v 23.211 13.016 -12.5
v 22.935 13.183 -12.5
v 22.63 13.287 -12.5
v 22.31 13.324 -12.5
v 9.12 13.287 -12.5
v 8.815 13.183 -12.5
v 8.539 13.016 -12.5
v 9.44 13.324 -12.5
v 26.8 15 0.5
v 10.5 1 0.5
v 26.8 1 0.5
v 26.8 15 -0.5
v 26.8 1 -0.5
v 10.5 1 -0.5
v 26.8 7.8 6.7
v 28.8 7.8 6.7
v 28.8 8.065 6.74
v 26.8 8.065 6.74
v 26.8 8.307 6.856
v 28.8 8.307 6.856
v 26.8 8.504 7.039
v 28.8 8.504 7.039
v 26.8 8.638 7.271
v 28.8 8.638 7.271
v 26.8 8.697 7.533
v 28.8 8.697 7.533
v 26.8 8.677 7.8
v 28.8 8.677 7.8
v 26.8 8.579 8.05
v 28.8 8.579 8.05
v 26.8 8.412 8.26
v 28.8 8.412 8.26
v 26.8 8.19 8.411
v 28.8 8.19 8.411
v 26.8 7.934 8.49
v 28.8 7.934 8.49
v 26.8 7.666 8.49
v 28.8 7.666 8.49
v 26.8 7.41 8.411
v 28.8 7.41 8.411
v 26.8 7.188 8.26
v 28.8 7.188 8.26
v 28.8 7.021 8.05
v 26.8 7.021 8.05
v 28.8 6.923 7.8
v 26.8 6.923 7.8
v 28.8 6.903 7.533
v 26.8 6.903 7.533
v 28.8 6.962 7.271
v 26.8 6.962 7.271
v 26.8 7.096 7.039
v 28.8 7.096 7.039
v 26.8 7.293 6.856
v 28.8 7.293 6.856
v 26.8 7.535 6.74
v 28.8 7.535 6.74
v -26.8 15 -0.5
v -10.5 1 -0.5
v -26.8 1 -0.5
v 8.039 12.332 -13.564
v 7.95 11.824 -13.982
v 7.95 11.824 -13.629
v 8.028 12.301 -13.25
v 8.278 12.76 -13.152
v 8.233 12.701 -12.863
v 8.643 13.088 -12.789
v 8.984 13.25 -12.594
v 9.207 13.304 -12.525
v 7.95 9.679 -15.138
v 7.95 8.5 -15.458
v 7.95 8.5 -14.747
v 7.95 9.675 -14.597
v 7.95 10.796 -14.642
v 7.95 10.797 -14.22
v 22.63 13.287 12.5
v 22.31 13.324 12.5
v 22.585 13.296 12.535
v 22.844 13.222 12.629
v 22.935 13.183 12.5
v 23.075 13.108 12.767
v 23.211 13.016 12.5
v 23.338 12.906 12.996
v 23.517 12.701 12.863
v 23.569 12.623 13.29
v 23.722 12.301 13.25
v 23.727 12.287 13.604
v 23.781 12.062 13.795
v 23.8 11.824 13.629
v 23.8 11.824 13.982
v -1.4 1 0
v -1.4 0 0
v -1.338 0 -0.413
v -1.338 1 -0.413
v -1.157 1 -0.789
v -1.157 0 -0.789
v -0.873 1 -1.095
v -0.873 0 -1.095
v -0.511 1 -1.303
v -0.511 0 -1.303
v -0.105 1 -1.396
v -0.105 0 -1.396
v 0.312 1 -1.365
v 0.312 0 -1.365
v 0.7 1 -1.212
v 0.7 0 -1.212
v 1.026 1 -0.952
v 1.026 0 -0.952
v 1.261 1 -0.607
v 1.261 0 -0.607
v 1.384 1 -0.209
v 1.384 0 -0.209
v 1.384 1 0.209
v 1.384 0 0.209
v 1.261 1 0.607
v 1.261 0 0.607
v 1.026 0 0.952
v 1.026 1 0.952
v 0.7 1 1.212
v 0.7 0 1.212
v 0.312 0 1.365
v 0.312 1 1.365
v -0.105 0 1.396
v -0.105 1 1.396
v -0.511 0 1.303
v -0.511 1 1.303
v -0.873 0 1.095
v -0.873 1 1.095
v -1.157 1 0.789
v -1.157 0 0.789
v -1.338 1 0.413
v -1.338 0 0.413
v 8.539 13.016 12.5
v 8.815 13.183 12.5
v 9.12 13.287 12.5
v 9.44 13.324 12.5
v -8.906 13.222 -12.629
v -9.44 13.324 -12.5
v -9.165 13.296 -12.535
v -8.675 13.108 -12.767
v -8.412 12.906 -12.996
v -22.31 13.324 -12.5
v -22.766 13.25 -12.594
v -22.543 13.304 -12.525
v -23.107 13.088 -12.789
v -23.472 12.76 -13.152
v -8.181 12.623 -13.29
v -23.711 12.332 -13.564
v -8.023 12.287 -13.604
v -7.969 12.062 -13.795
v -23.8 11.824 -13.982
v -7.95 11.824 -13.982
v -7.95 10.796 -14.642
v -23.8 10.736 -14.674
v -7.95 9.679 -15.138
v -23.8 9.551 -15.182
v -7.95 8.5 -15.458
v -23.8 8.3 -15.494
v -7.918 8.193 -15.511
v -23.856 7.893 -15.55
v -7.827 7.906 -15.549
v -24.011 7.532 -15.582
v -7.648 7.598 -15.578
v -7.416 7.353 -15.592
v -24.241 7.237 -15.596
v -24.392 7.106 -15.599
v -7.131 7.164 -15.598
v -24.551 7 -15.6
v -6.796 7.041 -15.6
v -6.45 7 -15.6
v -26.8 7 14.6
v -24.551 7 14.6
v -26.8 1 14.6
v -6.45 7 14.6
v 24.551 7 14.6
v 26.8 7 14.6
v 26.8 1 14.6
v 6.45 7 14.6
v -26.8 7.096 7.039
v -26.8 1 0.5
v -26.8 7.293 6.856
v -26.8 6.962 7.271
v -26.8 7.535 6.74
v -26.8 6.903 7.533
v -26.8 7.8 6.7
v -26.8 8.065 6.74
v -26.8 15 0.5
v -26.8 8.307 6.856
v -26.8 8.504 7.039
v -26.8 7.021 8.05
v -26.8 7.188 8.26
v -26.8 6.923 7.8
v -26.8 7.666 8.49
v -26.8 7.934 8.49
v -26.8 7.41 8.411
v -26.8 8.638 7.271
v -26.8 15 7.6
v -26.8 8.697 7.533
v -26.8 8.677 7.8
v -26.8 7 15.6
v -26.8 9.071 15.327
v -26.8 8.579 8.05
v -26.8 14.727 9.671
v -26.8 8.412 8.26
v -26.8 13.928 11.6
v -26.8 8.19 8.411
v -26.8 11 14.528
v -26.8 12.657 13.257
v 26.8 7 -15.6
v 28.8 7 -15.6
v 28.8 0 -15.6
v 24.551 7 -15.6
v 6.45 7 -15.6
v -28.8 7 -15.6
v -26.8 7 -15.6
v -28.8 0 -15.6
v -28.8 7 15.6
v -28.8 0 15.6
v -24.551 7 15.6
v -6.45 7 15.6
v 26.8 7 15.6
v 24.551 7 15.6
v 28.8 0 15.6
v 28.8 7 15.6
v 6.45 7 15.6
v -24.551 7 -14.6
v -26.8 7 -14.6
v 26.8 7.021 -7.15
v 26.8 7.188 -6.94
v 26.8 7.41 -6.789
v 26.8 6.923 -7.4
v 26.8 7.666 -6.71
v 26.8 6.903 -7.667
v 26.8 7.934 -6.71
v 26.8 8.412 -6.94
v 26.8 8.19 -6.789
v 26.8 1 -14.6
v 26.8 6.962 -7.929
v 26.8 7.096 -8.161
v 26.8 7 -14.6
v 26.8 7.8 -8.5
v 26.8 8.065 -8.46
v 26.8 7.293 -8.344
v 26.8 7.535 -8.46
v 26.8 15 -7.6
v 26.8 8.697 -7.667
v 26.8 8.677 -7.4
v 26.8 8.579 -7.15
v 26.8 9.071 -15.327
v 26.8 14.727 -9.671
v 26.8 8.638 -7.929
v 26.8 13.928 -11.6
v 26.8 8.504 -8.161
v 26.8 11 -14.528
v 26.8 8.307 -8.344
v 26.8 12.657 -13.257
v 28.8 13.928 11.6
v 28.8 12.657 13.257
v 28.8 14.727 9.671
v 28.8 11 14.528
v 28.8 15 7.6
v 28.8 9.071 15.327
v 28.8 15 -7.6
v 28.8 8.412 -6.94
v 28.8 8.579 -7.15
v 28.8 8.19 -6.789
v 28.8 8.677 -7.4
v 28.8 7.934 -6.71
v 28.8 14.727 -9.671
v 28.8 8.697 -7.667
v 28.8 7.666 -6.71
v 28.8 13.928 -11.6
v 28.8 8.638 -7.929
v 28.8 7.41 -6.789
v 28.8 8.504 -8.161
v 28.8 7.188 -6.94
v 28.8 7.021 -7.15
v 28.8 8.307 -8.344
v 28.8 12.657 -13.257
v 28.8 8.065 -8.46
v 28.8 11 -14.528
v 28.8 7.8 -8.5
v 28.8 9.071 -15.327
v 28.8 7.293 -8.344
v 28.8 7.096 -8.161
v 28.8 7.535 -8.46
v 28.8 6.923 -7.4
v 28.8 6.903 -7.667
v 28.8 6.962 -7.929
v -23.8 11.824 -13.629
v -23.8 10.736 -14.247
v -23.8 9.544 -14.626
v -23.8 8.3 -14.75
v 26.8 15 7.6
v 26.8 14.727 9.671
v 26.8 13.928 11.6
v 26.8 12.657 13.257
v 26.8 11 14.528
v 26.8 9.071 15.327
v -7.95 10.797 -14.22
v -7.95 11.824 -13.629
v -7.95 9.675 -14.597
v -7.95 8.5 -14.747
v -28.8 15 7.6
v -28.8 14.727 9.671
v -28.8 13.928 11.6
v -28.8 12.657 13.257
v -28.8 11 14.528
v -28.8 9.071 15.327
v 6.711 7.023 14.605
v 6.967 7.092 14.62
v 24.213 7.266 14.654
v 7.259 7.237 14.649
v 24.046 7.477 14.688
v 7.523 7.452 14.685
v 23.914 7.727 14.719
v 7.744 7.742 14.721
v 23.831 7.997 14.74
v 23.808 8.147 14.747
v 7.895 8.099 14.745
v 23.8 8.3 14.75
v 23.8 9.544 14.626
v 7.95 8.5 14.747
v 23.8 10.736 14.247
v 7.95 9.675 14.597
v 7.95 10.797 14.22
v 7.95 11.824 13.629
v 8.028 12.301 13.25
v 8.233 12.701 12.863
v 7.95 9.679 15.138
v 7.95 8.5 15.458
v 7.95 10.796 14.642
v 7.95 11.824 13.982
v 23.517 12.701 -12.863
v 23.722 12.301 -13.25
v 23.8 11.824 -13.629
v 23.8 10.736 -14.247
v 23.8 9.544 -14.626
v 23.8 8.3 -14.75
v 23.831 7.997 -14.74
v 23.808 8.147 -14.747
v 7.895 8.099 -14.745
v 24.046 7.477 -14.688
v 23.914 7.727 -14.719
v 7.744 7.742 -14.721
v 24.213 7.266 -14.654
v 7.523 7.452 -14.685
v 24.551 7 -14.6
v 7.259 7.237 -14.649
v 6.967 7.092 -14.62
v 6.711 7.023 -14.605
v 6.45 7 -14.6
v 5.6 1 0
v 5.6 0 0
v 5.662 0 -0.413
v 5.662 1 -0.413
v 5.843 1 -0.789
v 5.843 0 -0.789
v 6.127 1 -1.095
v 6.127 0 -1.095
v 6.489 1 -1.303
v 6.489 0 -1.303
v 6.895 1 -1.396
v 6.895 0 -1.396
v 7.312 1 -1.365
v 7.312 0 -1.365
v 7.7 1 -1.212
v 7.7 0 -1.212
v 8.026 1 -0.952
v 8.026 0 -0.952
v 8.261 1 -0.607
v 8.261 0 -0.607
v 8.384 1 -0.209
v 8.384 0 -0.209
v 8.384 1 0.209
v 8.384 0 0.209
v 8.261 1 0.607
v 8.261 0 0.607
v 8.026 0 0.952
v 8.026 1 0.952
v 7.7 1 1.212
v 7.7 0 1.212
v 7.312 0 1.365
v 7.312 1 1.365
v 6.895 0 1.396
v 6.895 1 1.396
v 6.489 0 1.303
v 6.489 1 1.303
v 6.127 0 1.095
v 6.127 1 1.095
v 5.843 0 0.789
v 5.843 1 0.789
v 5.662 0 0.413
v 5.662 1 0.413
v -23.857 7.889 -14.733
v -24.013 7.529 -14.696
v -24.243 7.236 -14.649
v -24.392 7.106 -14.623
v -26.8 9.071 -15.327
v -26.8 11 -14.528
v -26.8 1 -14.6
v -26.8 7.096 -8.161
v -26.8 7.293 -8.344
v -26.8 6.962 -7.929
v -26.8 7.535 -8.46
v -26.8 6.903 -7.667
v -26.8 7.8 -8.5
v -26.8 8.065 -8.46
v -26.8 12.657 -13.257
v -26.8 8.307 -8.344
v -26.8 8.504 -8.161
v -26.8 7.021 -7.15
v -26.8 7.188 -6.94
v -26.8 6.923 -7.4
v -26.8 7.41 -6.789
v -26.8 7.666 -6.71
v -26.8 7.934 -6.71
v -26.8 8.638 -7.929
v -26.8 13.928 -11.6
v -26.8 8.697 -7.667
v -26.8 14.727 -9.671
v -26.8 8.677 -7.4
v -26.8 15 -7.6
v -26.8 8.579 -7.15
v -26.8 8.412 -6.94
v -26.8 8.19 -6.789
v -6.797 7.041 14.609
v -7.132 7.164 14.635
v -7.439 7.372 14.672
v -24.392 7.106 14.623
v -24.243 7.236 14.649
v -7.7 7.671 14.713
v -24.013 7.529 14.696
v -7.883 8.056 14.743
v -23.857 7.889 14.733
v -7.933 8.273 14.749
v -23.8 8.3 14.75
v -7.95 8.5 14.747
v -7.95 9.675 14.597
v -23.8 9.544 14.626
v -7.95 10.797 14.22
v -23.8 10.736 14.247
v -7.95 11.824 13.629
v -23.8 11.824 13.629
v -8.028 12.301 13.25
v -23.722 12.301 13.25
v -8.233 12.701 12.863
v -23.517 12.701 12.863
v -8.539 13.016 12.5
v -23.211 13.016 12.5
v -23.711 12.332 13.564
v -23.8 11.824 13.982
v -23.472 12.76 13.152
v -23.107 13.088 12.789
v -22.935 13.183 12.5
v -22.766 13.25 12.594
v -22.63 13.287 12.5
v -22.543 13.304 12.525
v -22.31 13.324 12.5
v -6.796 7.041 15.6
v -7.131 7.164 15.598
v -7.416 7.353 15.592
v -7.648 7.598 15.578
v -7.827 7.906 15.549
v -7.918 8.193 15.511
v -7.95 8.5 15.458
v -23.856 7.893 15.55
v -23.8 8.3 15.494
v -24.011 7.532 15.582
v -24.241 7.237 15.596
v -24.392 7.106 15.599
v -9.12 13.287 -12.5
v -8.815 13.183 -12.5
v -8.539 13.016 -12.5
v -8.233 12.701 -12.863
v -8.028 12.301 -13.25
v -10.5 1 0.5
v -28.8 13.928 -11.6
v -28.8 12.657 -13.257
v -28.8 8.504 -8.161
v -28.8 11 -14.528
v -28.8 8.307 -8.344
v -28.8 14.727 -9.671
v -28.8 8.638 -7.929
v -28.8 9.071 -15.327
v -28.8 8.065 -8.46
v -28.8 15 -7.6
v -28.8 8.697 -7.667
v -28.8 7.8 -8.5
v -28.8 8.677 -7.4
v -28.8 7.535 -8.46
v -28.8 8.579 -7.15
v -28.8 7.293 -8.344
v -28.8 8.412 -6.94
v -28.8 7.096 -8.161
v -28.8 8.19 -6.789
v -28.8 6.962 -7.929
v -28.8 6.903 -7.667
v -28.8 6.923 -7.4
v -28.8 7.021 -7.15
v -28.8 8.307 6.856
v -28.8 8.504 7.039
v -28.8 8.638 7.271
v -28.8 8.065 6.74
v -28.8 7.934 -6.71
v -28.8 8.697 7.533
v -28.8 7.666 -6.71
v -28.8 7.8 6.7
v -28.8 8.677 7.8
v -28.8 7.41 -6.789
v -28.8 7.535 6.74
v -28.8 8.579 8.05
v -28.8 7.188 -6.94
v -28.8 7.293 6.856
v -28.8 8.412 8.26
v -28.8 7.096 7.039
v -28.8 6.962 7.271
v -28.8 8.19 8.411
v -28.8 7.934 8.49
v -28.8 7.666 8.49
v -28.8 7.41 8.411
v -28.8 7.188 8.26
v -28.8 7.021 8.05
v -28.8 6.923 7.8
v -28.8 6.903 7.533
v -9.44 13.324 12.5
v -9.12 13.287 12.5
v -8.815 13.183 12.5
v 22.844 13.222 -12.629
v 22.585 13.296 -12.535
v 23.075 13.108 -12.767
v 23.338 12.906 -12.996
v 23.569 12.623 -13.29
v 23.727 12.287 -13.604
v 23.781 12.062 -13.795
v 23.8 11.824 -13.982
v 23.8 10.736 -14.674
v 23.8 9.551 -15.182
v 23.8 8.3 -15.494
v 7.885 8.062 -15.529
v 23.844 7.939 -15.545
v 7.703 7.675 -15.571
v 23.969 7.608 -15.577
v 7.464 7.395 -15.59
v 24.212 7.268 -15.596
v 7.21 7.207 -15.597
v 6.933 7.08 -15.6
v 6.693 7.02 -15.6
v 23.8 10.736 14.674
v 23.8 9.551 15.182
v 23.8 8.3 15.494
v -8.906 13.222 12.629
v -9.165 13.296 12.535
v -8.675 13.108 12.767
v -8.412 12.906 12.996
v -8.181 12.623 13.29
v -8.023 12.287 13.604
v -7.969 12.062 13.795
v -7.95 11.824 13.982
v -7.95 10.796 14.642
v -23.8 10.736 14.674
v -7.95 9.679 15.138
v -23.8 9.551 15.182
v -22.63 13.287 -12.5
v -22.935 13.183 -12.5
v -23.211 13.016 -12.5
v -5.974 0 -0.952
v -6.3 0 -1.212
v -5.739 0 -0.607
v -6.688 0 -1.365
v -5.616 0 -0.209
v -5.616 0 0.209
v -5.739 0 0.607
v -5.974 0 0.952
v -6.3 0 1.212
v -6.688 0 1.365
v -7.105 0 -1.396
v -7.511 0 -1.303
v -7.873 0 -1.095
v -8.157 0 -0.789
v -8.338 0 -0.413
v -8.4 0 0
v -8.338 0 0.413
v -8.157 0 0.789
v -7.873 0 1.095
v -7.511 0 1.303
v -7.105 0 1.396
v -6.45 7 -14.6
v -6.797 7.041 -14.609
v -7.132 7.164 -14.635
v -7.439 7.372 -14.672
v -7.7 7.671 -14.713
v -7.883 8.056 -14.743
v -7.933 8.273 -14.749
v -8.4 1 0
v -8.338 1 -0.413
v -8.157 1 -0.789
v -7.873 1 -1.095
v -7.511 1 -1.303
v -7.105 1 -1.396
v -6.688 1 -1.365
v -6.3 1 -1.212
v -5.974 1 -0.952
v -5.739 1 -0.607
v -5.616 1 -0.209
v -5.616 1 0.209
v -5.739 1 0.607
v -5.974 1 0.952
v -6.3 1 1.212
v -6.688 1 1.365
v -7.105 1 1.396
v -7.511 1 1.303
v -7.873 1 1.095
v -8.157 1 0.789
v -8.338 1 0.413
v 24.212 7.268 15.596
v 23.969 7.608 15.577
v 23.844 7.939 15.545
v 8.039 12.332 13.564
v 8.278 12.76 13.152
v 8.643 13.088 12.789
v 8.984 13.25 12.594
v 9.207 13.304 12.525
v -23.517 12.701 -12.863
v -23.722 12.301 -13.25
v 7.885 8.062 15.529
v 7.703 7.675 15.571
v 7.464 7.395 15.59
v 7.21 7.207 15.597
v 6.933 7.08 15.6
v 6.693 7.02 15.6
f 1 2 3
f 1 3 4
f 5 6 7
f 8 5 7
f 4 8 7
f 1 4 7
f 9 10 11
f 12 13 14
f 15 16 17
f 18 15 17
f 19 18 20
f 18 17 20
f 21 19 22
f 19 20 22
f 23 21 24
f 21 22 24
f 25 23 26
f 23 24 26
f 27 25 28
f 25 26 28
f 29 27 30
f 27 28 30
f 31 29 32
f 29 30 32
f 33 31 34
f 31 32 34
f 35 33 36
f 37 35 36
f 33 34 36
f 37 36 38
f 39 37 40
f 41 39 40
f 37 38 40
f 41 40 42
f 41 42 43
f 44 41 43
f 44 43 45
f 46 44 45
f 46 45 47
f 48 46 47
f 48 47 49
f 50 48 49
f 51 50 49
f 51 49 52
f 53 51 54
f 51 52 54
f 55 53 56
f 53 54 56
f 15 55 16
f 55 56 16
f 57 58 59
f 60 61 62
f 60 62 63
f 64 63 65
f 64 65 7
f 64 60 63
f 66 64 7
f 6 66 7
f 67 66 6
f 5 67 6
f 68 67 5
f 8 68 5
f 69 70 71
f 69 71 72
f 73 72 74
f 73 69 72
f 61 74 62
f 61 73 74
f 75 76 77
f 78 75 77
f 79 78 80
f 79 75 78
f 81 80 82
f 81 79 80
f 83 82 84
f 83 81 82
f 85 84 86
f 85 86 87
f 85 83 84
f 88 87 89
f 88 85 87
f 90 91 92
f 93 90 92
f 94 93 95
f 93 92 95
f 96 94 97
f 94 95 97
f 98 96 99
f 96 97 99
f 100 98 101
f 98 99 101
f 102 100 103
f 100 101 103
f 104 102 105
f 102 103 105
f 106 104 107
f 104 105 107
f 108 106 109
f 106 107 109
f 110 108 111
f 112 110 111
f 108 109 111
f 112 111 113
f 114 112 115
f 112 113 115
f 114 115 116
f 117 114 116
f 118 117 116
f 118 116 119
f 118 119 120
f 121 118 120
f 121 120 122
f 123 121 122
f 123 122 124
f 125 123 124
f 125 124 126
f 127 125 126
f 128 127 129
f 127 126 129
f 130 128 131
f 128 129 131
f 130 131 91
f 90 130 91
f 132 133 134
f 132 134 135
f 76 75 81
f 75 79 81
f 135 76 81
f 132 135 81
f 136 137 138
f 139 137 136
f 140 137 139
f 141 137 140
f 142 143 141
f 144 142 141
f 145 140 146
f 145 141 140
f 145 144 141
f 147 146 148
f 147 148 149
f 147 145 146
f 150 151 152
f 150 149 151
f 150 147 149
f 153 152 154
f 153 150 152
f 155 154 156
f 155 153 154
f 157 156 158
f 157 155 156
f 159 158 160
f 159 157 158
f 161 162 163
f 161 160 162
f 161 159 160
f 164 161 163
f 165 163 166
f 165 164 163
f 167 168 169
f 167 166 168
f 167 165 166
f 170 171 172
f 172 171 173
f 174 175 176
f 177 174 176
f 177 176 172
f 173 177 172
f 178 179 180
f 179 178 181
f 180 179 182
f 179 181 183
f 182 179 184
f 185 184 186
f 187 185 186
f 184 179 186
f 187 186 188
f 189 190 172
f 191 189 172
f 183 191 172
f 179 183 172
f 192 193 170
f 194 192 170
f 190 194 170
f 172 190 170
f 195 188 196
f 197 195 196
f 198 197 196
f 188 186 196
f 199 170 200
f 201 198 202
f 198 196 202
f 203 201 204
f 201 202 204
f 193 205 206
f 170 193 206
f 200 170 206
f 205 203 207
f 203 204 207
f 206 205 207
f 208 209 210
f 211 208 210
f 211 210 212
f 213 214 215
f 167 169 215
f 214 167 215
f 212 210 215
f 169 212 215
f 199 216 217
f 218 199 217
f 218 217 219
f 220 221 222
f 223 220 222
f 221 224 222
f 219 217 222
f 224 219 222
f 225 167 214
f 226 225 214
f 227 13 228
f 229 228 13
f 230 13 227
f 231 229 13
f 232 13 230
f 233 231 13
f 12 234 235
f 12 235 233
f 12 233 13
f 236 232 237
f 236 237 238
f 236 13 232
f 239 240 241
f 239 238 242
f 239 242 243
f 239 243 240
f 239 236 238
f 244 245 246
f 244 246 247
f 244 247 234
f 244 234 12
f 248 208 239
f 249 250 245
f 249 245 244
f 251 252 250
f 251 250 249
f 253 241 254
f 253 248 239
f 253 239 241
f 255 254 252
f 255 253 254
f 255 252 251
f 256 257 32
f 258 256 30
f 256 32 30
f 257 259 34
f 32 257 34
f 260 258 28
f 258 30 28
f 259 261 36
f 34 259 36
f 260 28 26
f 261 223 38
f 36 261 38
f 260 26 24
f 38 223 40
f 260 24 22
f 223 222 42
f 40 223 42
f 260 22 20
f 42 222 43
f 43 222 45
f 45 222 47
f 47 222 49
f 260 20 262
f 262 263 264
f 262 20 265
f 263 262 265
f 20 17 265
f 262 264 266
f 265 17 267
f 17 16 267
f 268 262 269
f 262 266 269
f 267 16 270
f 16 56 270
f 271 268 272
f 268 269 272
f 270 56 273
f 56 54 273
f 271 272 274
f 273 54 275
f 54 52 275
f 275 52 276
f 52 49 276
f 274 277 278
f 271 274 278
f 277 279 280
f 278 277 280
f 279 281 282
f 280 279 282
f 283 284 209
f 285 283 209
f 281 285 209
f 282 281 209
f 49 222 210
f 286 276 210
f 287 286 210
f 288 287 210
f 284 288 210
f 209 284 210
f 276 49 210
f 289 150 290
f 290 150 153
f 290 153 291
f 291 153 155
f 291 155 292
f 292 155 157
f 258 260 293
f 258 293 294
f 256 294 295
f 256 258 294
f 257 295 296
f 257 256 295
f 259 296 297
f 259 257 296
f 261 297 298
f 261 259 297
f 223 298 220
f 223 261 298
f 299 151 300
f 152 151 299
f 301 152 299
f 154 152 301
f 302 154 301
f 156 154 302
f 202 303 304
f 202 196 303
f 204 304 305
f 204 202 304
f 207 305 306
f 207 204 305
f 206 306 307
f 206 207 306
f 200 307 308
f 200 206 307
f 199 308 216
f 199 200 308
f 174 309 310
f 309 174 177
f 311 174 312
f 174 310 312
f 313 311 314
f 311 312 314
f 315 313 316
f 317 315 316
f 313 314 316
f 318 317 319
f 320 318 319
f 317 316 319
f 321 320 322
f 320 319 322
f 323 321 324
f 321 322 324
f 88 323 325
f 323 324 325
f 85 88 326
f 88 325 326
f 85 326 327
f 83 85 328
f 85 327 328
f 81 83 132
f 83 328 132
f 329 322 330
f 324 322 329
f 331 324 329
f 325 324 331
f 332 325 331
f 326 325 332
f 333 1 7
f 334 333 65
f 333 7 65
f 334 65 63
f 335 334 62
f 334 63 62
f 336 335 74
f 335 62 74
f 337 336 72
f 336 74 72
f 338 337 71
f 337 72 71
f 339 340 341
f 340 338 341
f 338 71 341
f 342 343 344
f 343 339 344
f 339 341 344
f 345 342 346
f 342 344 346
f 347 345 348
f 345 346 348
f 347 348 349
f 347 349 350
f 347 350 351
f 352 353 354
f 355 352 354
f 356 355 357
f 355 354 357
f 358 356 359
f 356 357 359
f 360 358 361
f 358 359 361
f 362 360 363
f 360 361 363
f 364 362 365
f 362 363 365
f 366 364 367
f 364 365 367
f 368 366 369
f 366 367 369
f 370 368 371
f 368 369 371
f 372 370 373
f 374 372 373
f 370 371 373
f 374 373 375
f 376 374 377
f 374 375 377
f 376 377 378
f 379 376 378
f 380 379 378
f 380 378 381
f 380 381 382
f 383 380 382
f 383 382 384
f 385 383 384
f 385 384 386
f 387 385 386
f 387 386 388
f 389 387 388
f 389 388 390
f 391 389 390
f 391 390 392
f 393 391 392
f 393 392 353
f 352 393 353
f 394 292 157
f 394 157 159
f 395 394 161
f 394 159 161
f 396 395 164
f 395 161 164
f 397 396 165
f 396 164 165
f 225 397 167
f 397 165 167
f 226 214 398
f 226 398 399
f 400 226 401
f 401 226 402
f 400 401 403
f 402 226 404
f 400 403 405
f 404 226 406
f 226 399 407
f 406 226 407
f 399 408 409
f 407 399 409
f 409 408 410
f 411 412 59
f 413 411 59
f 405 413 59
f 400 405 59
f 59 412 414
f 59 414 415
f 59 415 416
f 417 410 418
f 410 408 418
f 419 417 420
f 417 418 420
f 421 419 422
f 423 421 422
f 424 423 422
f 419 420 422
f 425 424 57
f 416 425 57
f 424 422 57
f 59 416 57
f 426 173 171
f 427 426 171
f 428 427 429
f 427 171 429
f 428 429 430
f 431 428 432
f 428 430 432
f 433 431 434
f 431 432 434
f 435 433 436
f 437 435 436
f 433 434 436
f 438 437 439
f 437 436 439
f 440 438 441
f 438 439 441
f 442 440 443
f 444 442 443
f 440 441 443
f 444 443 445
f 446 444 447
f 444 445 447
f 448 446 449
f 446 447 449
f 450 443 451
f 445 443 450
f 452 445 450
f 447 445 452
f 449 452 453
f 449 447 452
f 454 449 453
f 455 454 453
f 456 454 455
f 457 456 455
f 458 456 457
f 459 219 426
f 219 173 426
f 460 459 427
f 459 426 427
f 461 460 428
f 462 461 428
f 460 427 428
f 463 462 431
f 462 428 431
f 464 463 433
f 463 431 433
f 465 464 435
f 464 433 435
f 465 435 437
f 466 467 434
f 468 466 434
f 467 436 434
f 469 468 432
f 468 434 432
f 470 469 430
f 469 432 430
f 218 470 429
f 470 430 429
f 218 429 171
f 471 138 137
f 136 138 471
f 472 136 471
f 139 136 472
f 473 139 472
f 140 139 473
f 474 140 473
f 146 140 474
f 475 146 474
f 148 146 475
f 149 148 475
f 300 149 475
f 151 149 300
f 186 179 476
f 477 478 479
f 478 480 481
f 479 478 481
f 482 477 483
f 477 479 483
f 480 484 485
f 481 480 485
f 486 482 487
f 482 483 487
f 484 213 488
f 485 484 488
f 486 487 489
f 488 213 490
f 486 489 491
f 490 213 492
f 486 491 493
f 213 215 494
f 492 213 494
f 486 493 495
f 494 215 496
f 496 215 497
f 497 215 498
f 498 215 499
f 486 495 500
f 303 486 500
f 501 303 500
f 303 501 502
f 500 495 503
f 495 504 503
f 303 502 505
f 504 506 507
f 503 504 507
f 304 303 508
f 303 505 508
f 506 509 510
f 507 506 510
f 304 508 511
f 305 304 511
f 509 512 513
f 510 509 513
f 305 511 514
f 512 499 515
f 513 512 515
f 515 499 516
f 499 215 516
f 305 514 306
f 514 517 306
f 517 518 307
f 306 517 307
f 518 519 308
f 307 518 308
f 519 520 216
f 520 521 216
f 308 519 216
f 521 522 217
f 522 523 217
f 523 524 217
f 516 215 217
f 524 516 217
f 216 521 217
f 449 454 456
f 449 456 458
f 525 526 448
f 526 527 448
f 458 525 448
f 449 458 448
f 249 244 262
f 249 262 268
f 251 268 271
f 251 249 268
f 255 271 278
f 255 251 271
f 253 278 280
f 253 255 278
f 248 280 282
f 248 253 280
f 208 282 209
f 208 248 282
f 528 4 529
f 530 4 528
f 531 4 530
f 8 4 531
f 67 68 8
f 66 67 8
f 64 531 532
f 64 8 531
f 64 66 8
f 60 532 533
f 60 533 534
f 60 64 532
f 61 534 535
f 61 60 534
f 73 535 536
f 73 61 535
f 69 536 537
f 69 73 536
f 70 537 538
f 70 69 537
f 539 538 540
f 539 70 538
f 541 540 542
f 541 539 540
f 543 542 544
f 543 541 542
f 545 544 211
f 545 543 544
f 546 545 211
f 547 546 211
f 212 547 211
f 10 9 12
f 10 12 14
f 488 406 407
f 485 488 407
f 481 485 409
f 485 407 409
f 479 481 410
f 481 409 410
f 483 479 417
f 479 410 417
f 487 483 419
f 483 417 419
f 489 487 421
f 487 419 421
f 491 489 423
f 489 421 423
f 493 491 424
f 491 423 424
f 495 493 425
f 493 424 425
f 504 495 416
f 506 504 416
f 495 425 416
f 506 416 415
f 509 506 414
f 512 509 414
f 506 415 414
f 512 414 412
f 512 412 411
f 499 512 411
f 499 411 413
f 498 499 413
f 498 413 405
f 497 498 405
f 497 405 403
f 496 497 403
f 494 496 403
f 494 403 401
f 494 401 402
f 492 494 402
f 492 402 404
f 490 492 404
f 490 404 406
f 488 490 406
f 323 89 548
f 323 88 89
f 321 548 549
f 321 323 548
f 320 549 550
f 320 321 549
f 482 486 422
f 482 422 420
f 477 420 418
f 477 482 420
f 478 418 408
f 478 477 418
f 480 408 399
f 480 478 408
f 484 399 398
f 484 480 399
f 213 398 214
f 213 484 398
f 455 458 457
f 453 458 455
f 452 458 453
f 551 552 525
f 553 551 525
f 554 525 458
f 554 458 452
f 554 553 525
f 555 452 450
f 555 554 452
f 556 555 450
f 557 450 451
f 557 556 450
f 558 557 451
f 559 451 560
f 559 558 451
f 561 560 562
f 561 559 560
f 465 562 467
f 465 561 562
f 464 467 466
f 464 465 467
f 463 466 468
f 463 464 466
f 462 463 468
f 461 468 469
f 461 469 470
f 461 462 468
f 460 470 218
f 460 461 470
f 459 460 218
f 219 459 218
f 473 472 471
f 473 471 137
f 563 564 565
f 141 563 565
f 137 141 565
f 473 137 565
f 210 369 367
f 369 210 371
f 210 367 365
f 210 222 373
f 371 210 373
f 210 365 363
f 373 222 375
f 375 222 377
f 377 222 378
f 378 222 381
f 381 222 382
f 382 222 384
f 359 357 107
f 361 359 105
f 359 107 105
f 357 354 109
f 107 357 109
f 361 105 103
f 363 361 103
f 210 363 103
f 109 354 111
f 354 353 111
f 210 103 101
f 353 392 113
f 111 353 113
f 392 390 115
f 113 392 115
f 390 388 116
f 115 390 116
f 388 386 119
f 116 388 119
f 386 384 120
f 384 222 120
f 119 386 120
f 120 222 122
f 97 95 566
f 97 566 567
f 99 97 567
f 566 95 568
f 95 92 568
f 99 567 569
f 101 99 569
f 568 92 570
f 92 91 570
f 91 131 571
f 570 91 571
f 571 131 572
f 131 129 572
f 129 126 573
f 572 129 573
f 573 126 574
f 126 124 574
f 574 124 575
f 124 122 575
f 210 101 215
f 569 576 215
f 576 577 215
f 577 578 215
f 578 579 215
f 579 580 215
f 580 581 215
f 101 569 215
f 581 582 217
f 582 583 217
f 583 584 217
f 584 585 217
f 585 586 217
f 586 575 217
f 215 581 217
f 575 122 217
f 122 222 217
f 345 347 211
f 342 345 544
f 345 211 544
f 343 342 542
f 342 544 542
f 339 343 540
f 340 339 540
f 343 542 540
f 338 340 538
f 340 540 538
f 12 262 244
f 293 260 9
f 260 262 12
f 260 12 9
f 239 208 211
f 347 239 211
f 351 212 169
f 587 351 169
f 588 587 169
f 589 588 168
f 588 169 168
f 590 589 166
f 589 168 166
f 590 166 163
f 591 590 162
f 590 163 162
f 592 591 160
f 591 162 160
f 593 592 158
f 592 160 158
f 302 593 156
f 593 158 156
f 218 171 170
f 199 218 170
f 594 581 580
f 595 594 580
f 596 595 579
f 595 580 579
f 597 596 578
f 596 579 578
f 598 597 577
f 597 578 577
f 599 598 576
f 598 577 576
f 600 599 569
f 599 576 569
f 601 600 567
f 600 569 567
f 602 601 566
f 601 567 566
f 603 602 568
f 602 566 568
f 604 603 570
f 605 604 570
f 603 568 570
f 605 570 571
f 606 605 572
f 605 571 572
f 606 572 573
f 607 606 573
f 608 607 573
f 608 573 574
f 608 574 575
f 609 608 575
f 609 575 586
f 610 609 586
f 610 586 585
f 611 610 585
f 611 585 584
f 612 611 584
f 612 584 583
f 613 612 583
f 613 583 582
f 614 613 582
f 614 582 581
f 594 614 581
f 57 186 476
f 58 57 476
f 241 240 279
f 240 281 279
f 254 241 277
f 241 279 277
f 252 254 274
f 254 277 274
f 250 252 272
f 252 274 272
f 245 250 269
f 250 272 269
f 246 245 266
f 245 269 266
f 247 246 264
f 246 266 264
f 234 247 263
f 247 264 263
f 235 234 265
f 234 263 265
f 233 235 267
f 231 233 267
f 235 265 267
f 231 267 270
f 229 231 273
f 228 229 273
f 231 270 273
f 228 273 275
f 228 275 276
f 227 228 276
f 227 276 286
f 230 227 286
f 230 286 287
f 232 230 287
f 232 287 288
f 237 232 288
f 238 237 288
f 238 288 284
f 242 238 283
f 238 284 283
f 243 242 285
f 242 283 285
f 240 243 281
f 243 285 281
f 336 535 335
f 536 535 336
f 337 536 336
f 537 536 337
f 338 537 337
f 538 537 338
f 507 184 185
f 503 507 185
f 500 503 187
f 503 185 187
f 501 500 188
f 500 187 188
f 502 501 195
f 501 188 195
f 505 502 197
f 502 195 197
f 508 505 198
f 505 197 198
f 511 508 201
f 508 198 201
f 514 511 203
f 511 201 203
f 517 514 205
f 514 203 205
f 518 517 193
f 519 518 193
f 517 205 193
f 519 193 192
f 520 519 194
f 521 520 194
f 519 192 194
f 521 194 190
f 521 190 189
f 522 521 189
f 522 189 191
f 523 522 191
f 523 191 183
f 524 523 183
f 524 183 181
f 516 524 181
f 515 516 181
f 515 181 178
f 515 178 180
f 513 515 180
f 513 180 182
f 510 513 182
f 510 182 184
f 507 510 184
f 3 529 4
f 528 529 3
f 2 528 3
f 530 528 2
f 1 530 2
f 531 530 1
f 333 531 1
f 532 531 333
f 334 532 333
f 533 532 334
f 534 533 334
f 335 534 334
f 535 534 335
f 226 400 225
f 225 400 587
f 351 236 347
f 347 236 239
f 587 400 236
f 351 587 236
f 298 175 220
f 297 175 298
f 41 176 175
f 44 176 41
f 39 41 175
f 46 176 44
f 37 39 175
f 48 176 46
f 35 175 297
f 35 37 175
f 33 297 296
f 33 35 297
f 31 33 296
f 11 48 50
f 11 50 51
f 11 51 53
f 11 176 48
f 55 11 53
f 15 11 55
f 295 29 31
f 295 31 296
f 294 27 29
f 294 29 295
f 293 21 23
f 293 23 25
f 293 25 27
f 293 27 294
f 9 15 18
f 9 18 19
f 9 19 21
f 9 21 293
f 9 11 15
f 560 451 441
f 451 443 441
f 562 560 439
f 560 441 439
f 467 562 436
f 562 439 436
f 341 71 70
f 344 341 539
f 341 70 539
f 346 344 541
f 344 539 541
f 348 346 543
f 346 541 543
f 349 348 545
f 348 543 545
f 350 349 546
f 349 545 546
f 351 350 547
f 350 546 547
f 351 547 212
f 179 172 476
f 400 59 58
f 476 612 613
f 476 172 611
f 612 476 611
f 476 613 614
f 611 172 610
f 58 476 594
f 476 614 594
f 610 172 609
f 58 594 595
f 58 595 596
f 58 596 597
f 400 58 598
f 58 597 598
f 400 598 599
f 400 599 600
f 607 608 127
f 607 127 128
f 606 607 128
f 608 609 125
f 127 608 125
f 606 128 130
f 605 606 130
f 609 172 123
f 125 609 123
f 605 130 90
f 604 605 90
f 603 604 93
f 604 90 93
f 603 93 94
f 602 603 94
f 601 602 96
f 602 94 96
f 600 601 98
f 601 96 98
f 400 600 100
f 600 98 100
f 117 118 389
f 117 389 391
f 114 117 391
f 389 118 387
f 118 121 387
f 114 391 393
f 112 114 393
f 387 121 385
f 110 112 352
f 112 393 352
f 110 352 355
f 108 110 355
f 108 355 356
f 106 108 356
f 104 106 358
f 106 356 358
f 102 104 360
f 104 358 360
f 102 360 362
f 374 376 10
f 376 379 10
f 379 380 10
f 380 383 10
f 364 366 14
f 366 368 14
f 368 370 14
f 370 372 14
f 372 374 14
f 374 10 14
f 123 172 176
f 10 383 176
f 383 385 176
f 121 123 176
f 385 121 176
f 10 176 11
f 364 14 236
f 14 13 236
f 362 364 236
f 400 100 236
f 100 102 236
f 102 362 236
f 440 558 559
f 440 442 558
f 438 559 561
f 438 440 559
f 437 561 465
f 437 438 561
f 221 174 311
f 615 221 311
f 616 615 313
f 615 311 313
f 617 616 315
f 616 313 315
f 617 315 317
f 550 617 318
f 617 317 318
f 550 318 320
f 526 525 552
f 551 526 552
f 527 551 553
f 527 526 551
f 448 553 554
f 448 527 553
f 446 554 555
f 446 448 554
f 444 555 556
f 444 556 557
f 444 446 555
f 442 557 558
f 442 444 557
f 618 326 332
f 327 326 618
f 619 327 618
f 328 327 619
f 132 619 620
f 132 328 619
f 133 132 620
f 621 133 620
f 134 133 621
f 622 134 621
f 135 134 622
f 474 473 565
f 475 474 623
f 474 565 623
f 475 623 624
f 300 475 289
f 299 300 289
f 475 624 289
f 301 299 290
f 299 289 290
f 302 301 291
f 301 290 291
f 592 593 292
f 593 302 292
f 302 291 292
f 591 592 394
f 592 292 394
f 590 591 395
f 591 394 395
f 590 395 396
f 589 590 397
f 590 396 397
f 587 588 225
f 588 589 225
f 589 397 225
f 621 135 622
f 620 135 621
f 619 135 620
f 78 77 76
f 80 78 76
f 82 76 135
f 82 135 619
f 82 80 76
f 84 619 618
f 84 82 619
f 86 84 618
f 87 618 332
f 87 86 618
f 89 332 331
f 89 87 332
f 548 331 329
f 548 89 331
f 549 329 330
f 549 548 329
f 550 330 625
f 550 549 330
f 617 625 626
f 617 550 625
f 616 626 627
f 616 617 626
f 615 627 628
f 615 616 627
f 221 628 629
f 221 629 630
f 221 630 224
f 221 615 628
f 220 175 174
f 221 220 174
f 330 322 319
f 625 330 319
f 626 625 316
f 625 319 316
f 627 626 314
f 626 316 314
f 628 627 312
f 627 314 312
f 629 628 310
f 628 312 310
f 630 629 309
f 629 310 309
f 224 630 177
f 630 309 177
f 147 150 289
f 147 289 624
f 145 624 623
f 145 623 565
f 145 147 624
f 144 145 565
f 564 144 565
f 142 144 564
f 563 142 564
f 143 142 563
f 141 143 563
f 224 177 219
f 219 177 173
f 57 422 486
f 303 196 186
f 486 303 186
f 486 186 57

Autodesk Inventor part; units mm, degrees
ref_plane "YZ Plane" through (0, 0, 0) normal (1, 0, 0) x (0, 1, 0)
sketch "Sketch2" plane through (0, 0, 0) normal (0, 1, 0) x (-1, 0, 0)
  line L0 (28.8, 15.6) -> (-28.8, 15.6)
  line L1 (-28.8, 15.6) -> (-28.8, -15.6)
  line L2 (-28.8, -15.6) -> (28.8, -15.6)
  line L3 (28.8, -15.6) -> (28.8, 15.6)
  line L4 (28.8, 15.6) -> (-28.8, -15.6) construction
  line L5 (-28.8, 15.6) -> (28.8, -15.6) construction
  circle A0 centre (7, 0) radius 1.4
  circle A1 centre (0, 0) radius 1.4
  circle A2 centre (-7, 0) radius 1.4
  dimension "d0" = 57.6
  dimension "d1" = 31.2
  dimension "d2" = 2.8
  dimension "d3" = 21.8
  dimension "d4" = 2.8
  dimension "d5" = 2.8
  dimension "d6" = 7
  dimension "d7" = 7
extrude "Extrusion1" add sketch "Sketch2" along normal blind 15
fillet "Fillet1" radius 8 2 edges at (0, 15, 15.6) (0, 15, -15.6)
ref_plane "Work Plane1" through (26.8, 0, 15.6) normal (1, 0, 0) x (0, 0, -1)
sketch "Sketch3" plane through (26.8, 0, 15.6) normal (1, 0, 0) x (0, 0, -1)
  arc A0 (8, 15) -> (0, 7) centre (8, 7) ccw
  arc A1 (8, 15) -> (0, 7) centre (8, 7) ccw projected
  arc A2 (8, 14) -> (1, 7) centre (8, 7) ccw
  arc A3 (31.2, 7) -> (23.2, 15) centre (23.2, 7) ccw projected
  arc A4 (30.2, 7) -> (23.2, 14) centre (23.2, 7) ccw
  line L0 (1, 7) -> (1, 1)
  line L1 (31.2, 0) -> (0, 0) projected
  line L2 (1, 1) -> (30.2, 1)
  line L3 (31.2, 0) -> (31.2, 7) projected
  line L4 (30.2, 1) -> (30.2, 7)
  line L5 (23.2, 15) -> (8, 15)
  line L6 (23.2, 14) -> (8, 14)
  point P0 (15.6, 0)
  dimension "d12" = 7
  dimension "d13" = 7
  dimension "d14" = 6
  dimension "d15" = 29.2
extrude "Extrusion2" cut sketch "Sketch3" against normal blind 53.6
sketch "Sketch4" plane through (0, 15, 0) normal (0, 1, 0) x (1, 0, 0)
  line L0 (26.8, -14.6) -> (26.8, 14.6) projected
  line L1 (-26.8, -12.5) -> (26.8, -12.5)
  line L2 (26.8, -12.5) -> (26.8, 12.5)
  line L3 (26.8, 12.5) -> (-26.8, 12.5)
  line L4 (-26.8, 12.5) -> (-26.8, -12.5)
  line L5 (-26.8, -12.5) -> (26.8, 12.5) construction
  line L6 (26.8, -12.5) -> (-26.8, 12.5) construction
  point P0 (0, 0)
  dimension "d51" = 25
extrude "Extrusion3" cut sketch "Sketch4" against normal blind 3
ref_plane "Work Plane2" through (28.8, 0, -15.6) normal (0, 0, -1) x (-1, 0, 0)
sketch "Sketch8" plane through (-26.8, 0, 15.6) normal (1, 0, 0) x (0, 0, -1)
  line L0 (3.1, 13.3238) -> (3.1, 12) projected
  arc A0 (3.1, 13.0156) -> (1, 7) centre (6.8512, 8.3318) ccw
  line L1 (8, 15) -> (23.2, 15) projected
  line L2 (15.6, 15) -> (15.6, 0.9201)
  arc A1 (30.2, 7) -> (28.1, 13.0156) centre (24.3488, 8.3318) ccw
  line L3 (28.1, 13.0156) -> (3.1, 13.0156)
  arc A2 (30.2, 7) -> (28.099, 12) centre (23.2, 7) ccw projected
  line L4 (1, 7) -> (30.2, 7)
  point P0 (15.6, 0)
extrude "Extrusion6" cut sketch "Sketch8" along normal blind 53.6
sketch "Sketch9" plane through (28.8, 0, -15.6) normal (0, 0, -1) x (-1, 0, 0)
  line L0 (2, 13.3238) -> (5, 13.3238)
  line L1 (5, 11.8238) -> (5, 8.2996)
  line L2 (3.5, 6.7996) -> (2, 6.7996)
  line L3 (2, 6.7996) -> (2, 13.3238)
  arc A0 (3.5, 6.7996) -> (5, 8.2996) centre (3.5, 8.2996) ccw
  arc A1 (6.5, 13.3238) -> (5, 11.8238) centre (6.5, 11.8238) ccw
  line L4 (5, 13.3238) -> (6.5, 13.3238)
  line L5 (28.8, 0) -> (28.8, 13.3238)
  line L6 (55.6, 13.3238) -> (52.6, 13.3238)
  line L7 (52.6, 11.8238) -> (52.6, 8.2996)
  line L8 (54.1, 6.7996) -> (55.6, 6.7996)
  line L9 (55.6, 6.7996) -> (55.6, 13.3238)
  arc A2 (52.6, 8.2996) -> (54.1, 6.7996) centre (54.1, 8.2996) ccw
  arc A3 (52.6, 11.8238) -> (51.1, 13.3238) centre (51.1, 11.8238) ccw
  line L10 (52.6, 13.3238) -> (51.1, 13.3238)
  line L11 (55.6, 13.3238) -> (2, 13.3238) projected
  line L12 (2, 7) -> (55.6, 7) projected
  line L13 (20.85, 13.3238) -> (36.75, 13.3238)
  line L14 (36.75, 11.8238) -> (36.75, 8.5)
  line L15 (35.25, 7) -> (22.35, 7)
  line L16 (20.85, 8.5) -> (20.85, 11.8238)
  arc A4 (20.85, 8.5) -> (22.35, 7) centre (22.35, 8.5) ccw
  arc A5 (35.25, 7) -> (36.75, 8.5) centre (35.25, 8.5) ccw
  arc A6 (38.25, 13.3238) -> (36.75, 11.8238) centre (38.25, 11.8238) ccw
  arc A7 (20.85, 11.8238) -> (19.35, 13.3238) centre (19.35, 11.8238) ccw
  line L17 (20.85, 13.3238) -> (19.35, 13.3238)
  line L18 (36.75, 13.3238) -> (38.25, 13.3238)
  point P0 (53.3509, 7)
  point P1 (4.2491, 7)
  dimension "d55" = 3
  dimension "d57" = 1.5
  dimension "d58" = 1.5
  dimension "d59" = 3
  dimension "d60" = 1.5
  dimension "d63" = 15.85
  dimension "d64" = 3
  dimension "d65" = 1.5
  dimension "d66" = 1.5
  dimension "d67" = 3
  dimension "d68" = 1.5
  dimension "d69" = 1.5
  dimension "d70" = 3
  dimension "d71" = 1.5
  dimension "d72" = 1.5
  dimension "d73" = 3
  dimension "d74" = 1.5
  dimension "d75" = 1.5
extrude "Extrusion7" cut sketch "Sketch9" against normal blind 53.8 contours L0 L4 A1 L1 A0 L12 L3 | L11 L5 L12 A4 L16 A7 | L5 L11 A6 L14 A5 L12 | A2 L7 A3 L10 L6 L9 L12
sketch "Sketch10" plane through (26.8, 1, 14.6) normal (0, 1, 0) x (1, 0, 0)
  line L0 (0, 0) -> (0, 29.2) projected
  line L1 (0, 14.1) -> (0, 15.1)
  line L2 (-53.6, 15.1) -> (-53.6, 14.1)
  circle A0 centre (-26.8, 14.6) radius 1.4 projected
  line L3 (-53.6, 14.1) -> (0, 15.1) construction
  line L4 (0, 14.1) -> (-53.6, 15.1) construction
  line L5 (-37.3, 14.1) -> (-37.3, 15.1)
  circle A1 centre (-33.8, 14.6) radius 1.4 projected
  line L6 (-16.3, 15.1) -> (-16.3, 14.1)
  circle A2 centre (-19.8, 14.6) radius 1.4 projected
  line L7 (-53.6, 14.1) -> (-37.3, 14.1)
  line L8 (-16.3, 14.1) -> (0, 14.1)
  line L9 (0, 15.1) -> (-16.3, 15.1)
  line L10 (-37.3, 15.1) -> (-53.6, 15.1)
  dimension "d78" = 1
  dimension "d79" = 3.5
  dimension "d80" = 3.5
extrude "Extrusion8" add sketch "Sketch10" along normal blind 14 contours L8 L6 L9 L0 | L10 L5 L7 L2
sketch "Sketch11" plane through (-26.8, 1, 0.5) normal (0, 0, 1) x (1, 0, 0)
  line L0 (16.3, 14) -> (0, 14) projected
  line L1 (16.3, 0) -> (0, 0) projected
  line L2 (0, 14) -> (16.3, 0)
  line L3 (16.3, 0) -> (16.3, 14)
  line L4 (20.35, 6) -> (2.2491, 6) projected
  line L5 (0, 14) -> (16.3, 14) projected
  line L6 (16.3, 14) -> (0, 14)
  point P0 (26.8, -1)
extrude "Extrusion9" cut sketch "Sketch11" against normal blind 1
sketch "Sketch12" plane through (10.5, 1, 0.5) normal (0, 0, 1) x (1, 0, 0)
  line L0 (16.3, 0) -> (0, 0) projected
  line L1 (16.3, 14) -> (0, 0)
  line L2 (0, 14) -> (16.3, 14) projected
  line L3 (0, 0) -> (0, 14)
  line L4 (16.3, 0) -> (16.3, 14) projected
  line L5 (0, 14) -> (16.3, 14)
  point P0 (-10.5, -1)
extrude "Extrusion10" cut sketch "Sketch12" against normal blind 1 contours L3 L2 L1
sketch "Sketch13" plane through (28.8, 0, 15.6) normal (1, 0, 0) x (0, 0, -1)
  circle A0 centre (8, 7.8) radius 0.9
  line L0 (8, 15) -> (23.2, 15) projected
  line L1 (0, 0) -> (0, 7) projected
  line L2 (15.6, 0) -> (15.6, 15)
  line L3 (31.2, 0) -> (31.2, 7) projected
  circle A1 centre (23.2, 7.8) radius 0.9
  dimension "d87" = 1.8
  dimension "d88" = 7.2
  dimension "d89" = 8
  dimension "d90" = 15.6
  dimension "d91" = 15.6
extrude "Extrusion11" cut sketch "Sketch13" against normal blind 2
sketch "Sketch14" plane through (-26.8, 0, 15.6) normal (1, 0, 0) x (0, 0, -1)
  circle A0 centre (8, 7.8) radius 0.9 projected
  circle A1 centre (8, 7.8) radius 0.9
  circle A2 centre (23.2, 7.8) radius 0.9 projected
  circle A3 centre (23.2, 7.8) radius 0.9
  point P0 (15.6, 0)
extrude "Extrusion12" cut sketch "Sketch14" against normal blind 2
properties part number "Main body" material "ABS Plastic"
